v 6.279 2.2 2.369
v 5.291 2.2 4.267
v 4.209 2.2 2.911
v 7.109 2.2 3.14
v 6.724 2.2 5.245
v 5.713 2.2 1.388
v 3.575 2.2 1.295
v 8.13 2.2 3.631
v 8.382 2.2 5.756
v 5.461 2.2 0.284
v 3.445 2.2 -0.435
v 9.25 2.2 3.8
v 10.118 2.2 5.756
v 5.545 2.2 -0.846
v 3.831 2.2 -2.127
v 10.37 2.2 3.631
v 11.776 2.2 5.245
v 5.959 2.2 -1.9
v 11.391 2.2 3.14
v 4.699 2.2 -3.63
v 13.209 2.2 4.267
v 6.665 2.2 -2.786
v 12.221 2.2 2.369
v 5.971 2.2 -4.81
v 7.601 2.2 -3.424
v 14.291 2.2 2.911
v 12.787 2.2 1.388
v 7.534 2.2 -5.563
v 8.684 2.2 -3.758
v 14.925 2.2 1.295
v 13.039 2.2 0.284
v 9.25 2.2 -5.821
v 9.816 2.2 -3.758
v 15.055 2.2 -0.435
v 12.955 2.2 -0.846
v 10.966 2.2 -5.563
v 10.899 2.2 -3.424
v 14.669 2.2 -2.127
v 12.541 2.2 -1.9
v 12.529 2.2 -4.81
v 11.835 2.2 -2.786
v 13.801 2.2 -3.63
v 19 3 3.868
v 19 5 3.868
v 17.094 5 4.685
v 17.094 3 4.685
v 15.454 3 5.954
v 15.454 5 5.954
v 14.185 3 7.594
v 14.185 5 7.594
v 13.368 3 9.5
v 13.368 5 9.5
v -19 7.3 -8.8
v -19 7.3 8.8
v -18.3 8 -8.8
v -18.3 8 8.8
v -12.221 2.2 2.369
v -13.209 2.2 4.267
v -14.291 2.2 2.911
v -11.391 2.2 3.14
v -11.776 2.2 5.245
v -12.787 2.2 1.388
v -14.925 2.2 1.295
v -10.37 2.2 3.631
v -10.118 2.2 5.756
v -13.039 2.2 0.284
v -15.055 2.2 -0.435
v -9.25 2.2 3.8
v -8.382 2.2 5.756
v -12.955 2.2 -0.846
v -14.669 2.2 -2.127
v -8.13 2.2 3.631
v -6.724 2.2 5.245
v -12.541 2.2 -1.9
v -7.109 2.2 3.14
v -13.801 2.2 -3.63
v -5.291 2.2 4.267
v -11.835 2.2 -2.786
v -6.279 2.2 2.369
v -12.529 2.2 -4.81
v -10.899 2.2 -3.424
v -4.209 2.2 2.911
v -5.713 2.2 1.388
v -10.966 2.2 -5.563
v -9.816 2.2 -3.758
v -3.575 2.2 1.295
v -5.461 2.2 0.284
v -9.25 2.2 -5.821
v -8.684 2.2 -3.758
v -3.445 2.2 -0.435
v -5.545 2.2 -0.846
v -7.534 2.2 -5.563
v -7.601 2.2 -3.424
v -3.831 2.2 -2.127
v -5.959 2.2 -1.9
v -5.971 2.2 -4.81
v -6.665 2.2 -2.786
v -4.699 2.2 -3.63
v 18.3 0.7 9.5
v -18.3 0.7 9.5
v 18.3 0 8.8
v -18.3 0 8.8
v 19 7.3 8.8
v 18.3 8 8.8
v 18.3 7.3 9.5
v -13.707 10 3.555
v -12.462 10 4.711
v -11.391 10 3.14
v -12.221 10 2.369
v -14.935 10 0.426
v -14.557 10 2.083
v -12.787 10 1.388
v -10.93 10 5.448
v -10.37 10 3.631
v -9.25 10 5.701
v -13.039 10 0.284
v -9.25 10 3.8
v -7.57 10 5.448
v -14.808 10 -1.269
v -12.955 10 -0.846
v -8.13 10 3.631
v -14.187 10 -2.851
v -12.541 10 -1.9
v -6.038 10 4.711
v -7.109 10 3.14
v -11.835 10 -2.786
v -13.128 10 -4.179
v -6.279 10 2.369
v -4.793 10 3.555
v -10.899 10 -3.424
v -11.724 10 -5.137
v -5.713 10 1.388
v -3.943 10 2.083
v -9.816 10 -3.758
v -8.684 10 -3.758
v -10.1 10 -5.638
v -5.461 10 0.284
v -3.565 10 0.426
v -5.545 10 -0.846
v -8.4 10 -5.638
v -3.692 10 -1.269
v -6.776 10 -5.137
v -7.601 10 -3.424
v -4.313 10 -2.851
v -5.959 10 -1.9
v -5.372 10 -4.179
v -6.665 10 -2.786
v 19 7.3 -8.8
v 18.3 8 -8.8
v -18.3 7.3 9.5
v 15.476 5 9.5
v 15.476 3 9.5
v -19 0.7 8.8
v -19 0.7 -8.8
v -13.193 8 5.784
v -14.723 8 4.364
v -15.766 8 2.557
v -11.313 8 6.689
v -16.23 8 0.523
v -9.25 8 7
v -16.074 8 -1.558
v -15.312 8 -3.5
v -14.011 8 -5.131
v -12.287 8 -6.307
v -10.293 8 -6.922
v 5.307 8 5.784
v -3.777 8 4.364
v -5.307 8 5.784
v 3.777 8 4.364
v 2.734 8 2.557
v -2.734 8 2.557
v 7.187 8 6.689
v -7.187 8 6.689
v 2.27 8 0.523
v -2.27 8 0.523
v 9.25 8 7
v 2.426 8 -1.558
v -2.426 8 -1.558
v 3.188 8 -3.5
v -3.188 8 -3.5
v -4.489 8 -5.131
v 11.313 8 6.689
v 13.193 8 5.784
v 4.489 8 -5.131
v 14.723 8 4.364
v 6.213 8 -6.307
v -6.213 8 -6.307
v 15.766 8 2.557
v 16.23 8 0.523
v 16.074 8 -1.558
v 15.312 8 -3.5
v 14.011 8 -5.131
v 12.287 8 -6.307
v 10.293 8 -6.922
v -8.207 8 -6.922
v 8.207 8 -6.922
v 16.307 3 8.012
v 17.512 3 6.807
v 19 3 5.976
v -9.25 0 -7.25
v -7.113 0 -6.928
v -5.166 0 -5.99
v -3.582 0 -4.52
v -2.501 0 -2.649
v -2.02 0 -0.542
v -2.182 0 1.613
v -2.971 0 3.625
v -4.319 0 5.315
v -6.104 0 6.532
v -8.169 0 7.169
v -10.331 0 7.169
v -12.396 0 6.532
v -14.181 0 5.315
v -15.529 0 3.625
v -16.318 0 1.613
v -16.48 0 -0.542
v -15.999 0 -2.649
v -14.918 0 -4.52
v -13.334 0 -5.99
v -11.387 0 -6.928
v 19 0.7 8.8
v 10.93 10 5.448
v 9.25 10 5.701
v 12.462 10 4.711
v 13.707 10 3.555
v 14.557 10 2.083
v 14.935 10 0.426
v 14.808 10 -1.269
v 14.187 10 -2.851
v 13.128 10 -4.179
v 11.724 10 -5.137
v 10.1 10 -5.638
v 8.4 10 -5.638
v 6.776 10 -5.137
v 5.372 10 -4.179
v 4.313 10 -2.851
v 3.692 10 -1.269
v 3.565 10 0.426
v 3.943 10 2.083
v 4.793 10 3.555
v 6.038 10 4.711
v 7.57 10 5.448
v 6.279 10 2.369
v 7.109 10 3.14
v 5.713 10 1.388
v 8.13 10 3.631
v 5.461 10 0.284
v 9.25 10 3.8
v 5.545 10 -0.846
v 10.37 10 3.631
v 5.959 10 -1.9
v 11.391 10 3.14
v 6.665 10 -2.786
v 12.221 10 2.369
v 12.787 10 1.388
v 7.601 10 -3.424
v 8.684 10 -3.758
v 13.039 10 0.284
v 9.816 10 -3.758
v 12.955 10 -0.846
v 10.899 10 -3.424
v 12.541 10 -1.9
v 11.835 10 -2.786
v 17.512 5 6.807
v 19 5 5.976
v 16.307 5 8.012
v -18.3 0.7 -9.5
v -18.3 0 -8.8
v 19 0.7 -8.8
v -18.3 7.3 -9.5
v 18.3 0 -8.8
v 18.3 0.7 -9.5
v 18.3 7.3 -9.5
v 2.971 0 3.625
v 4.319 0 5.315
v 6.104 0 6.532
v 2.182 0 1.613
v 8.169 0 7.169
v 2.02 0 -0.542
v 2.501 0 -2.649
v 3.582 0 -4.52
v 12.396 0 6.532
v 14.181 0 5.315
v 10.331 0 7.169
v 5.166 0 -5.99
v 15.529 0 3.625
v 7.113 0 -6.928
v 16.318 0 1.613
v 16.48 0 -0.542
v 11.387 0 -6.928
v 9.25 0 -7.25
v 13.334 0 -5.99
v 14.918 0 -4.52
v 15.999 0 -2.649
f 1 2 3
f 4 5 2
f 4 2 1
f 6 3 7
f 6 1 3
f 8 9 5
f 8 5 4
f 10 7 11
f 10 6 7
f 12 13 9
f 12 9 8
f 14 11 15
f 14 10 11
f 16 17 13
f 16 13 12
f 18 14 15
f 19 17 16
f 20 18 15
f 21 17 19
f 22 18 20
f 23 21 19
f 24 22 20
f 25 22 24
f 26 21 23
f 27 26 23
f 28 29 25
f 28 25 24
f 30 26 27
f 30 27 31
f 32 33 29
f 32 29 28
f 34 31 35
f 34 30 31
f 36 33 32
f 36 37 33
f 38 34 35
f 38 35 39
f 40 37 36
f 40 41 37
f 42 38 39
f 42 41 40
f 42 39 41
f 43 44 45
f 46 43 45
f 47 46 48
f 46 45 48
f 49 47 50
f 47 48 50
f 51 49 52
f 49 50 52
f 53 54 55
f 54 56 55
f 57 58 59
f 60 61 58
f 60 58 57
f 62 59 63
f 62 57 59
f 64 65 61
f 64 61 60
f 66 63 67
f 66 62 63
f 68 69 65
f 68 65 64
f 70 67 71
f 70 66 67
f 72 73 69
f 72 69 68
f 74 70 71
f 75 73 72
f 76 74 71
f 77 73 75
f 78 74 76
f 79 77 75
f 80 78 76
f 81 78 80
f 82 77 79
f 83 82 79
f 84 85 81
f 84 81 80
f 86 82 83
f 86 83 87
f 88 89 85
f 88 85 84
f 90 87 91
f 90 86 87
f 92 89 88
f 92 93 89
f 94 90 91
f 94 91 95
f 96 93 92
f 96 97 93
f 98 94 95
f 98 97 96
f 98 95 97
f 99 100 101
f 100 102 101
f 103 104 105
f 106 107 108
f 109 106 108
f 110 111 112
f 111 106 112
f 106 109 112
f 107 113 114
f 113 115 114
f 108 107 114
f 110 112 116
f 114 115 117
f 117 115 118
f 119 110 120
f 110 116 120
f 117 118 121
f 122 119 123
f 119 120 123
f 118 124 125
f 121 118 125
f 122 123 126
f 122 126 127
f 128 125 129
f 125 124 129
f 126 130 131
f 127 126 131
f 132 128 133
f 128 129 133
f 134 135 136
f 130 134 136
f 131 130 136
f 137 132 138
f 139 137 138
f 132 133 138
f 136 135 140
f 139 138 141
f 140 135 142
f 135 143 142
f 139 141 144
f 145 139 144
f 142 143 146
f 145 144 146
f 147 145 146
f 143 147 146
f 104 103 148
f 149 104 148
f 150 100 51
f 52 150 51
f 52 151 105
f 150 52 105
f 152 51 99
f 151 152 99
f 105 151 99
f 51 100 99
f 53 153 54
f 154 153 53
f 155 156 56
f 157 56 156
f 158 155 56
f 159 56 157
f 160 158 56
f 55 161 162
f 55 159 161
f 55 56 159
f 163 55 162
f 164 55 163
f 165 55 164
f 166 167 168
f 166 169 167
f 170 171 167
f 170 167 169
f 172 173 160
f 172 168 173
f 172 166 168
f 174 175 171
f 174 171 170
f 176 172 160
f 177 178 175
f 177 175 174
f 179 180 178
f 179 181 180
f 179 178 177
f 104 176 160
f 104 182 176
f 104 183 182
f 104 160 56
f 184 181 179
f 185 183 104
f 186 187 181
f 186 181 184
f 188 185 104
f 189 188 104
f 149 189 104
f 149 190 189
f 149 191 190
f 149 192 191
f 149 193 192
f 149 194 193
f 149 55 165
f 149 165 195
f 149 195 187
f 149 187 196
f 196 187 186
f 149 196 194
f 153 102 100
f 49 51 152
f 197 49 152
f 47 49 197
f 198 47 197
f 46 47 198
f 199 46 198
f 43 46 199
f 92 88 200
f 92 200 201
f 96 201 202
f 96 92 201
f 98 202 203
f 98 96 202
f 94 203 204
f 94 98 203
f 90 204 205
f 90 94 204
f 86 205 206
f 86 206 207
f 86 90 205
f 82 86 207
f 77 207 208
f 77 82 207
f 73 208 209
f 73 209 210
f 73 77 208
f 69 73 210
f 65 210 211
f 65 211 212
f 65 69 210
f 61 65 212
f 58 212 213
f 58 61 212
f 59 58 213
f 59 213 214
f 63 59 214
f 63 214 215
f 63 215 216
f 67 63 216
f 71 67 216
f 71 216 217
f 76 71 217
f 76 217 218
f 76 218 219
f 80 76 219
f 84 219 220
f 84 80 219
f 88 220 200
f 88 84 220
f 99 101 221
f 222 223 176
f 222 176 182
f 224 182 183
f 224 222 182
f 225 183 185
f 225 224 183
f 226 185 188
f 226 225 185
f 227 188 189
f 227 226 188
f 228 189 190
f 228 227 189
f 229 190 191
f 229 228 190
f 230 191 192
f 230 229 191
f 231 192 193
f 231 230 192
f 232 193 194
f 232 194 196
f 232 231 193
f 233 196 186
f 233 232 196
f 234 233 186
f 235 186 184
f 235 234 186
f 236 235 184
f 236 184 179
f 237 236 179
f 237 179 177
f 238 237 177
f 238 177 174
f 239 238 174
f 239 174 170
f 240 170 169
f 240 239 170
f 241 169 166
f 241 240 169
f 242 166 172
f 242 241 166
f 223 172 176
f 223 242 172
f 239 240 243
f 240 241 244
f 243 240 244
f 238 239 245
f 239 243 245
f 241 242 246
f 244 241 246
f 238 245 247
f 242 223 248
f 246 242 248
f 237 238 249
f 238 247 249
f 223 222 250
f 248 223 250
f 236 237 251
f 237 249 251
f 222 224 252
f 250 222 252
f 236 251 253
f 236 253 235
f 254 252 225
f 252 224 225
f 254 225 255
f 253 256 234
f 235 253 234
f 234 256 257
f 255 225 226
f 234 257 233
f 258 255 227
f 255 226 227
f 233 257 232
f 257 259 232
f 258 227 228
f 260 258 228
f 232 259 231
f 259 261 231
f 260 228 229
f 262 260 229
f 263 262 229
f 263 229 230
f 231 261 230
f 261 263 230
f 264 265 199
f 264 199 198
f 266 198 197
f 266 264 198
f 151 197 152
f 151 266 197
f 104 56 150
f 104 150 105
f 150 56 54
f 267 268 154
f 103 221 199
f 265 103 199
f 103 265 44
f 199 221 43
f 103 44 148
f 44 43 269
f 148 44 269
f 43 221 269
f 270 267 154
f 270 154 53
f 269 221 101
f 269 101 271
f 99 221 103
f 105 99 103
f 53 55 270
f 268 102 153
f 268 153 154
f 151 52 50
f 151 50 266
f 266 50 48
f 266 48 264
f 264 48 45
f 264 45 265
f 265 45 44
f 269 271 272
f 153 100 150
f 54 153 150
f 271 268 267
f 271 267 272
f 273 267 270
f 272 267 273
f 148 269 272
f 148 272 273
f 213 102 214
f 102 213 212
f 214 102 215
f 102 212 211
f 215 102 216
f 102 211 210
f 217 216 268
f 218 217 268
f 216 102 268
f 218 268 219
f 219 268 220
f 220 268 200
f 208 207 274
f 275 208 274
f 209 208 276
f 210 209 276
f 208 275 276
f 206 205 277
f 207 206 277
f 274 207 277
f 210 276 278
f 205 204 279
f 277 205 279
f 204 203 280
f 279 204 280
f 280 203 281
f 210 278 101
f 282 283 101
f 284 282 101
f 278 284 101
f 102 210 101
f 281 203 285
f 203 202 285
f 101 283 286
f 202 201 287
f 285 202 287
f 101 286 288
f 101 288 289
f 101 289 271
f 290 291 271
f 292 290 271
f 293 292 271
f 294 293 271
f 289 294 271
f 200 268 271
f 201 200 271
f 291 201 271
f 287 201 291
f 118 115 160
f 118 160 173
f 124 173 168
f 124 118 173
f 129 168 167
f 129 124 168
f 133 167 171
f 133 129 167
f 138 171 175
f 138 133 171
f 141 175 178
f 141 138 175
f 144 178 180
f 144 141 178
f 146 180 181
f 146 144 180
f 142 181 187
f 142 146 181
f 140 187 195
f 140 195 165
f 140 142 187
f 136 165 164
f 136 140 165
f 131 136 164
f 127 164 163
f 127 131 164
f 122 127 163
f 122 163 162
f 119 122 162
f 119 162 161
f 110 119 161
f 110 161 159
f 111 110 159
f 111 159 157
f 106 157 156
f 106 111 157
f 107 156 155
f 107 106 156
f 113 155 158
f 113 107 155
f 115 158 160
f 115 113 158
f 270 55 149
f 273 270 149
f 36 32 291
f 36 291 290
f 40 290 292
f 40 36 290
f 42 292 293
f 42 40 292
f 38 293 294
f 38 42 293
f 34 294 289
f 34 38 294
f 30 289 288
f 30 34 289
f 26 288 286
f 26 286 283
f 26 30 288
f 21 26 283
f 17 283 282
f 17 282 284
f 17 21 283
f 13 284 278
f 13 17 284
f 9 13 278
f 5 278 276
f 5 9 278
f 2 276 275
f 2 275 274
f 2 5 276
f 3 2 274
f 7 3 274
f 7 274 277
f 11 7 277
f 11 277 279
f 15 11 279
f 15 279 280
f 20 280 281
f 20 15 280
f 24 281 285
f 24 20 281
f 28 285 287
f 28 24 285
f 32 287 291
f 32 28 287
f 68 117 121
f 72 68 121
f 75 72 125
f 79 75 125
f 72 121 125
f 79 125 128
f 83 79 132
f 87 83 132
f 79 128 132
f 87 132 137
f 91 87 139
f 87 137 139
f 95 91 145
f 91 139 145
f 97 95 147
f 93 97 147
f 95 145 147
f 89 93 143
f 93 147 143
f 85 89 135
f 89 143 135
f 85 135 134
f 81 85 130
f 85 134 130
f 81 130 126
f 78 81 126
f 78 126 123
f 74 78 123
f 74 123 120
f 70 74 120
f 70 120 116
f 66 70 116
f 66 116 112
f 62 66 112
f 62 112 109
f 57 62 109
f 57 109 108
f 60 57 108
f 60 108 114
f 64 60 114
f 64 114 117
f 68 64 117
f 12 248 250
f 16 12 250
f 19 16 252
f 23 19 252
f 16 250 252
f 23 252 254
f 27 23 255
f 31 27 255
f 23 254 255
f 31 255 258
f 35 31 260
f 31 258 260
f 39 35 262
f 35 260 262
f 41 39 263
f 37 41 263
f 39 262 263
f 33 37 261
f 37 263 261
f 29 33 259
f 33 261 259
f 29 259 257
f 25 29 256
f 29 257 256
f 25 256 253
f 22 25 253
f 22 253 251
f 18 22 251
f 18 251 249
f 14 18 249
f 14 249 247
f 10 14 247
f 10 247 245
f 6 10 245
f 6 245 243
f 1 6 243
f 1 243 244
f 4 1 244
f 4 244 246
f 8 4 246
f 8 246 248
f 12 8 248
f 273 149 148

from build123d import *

# Parameters (mm, degrees)
CROQUIS1_W              = 38
CROQUIS1_H              = 19
SALIENTE_EXTRUIR1_DEPTH = 8
CROQUIS2_R              = 5
SALIENTE_EXTRUIR2_DEPTH = 2
CROQUIS3_R              = 3.8
CORTAR_EXTRUIR1_DEPTH   = 24.478713764
CHAFL_N2_SIZE           = 0.7
CROQUIS4_R              = 5.25
CORTAR_EXTRUIR2_DEPTH   = 2.2
CHAFL_N1_SIZE           = 2
CHAFL_N1_SIZE_2         = 3.079729928
CORTAR_EXTRUIR3_START   = -3
CROQUIS6_R              = 8.19764283
CROQUIS6_R_2            = 6.19764283
CORTAR_EXTRUIR3_DEPTH   = 2


with BuildPart() as part:
    # Croquis1 → Saliente-Extruir1 (new body)
    with BuildSketch(Plane(origin=(0, 0, 0), x_dir=(1, 0, 0), z_dir=(0, 1, 0))):
        Rectangle(CROQUIS1_W, CROQUIS1_H)
    extrude(amount=SALIENTE_EXTRUIR1_DEPTH)

    # Croquis2 → Saliente-Extruir2 (add)
    with BuildSketch(Plane(origin=(0, 8, 0), x_dir=(1, 0, 0), z_dir=(0, 1, 0))):
        with Locations(Location((-9.25, 0, 0), (0, 0, 270))):
            Circle(CROQUIS2_R)
        with Locations(Location((9.25, 0, 0), (0, 0, 270))):
            Circle(CROQUIS2_R)
    extrude(amount=SALIENTE_EXTRUIR2_DEPTH)

    # Croquis3 → Cortar-Extruir1 (cut, through all)
    with BuildSketch(Plane(origin=(0, 10, 0), x_dir=(1, 0, 0), z_dir=(0, 1, 0))):
        with Locations(Location((9.25, 0, 0), (0, 0, 270))):
            Circle(CROQUIS3_R)
        with Locations(Location((-9.25, 0, 0), (0, 0, 270))):
            Circle(CROQUIS3_R)
    extrude(amount=-CORTAR_EXTRUIR1_DEPTH, mode=Mode.SUBTRACT)

    # Chaflán2
    chafl_n2_edges = [part.edges().sort_by_distance(p)[0] for p in [
        (-19, 8, 0),
        (0, 8, 9.5),
        (19, 8, 0),
        (0, 0, 9.5),
        (-19, 0, 0),
        (0, 0, -9.5),
        (19, 0, 0),
        (0, 8, -9.5),
        (19, 4, 9.5),
        (-19, 4, 9.5),
        (-19, 4, -9.5),
        (19, 4, -9.5),
    ]]
    chamfer(chafl_n2_edges, length=CHAFL_N2_SIZE)

    # Croquis4 → Cortar-Extruir2 (cut)
    with BuildSketch(Plane.XZ):
        with Locations(Location((9.25, 0, 0), (0, 0, 270))):
            Circle(CROQUIS4_R)
        with Locations(Location((-9.25, 0, 0), (0, 0, 270))):
            Circle(CROQUIS4_R)
    extrude(amount=-CORTAR_EXTRUIR2_DEPTH, mode=Mode.SUBTRACT)

    # Chaflán1
    # the kernel refuses this chamfer: 3.079729928, 2 mm, written as the material it adds along each edge
    with BuildSketch(Plane(origin=(9.25, 8, 0), x_dir=(0, 0, 1), z_dir=(-1, 0, 0))) as chafl_n1_piece_1_section:
        Polygon((5 + CHAFL_N1_SIZE, 0), (5, CHAFL_N1_SIZE_2), (5, 0), align=None)
    chafl_n1_piece_1 = revolve(axis=Axis((9.25, 8, 0), (0, 1, 0)), mode=Mode.PRIVATE)
    chafl_n1_piece_1 = split(chafl_n1_piece_1, bisect_by=Plane(origin=(9.25, 10, -6.344305077), z_dir=(0, -1, 0)), keep=Keep.TOP, mode=Mode.PRIVATE)
    add(chafl_n1_piece_1)
    with BuildSketch(Plane(origin=(-9.25, 8, 0), x_dir=(0, 0, 1), z_dir=(-1, 0, 0))) as chafl_n1_piece_2_section:
        Polygon((5 + CHAFL_N1_SIZE, 0), (5, CHAFL_N1_SIZE_2), (5, 0), align=None)
    chafl_n1_piece_2 = revolve(axis=Axis((-9.25, 8, 0), (0, 1, 0)), mode=Mode.PRIVATE)
    chafl_n1_piece_2 = split(chafl_n1_piece_2, bisect_by=Plane(origin=(-9.25, 10, -6.344305078), z_dir=(0, -1, 0)), keep=Keep.TOP, mode=Mode.PRIVATE)
    add(chafl_n1_piece_2)
    # the kernel refuses this chamfer: 3.079729928, 2 mm, written as the material it takes off along each edge
    with BuildSketch(Plane(origin=(-9.25, 0, 0), x_dir=(0, 0, -1), z_dir=(-1, 0, 0))) as chafl_n1_2_piece_1_section:
        Polygon((5.25 + CHAFL_N1_SIZE, 0), (5.25, -CHAFL_N1_SIZE_2), (5.25, 0), align=None)
    chafl_n1_2_piece_1 = revolve(axis=Axis((-9.25, 0, 0), (0, -1, 0)), mode=Mode.PRIVATE)
    chafl_n1_2_piece_1 = split(chafl_n1_2_piece_1, bisect_by=Plane(origin=(-9.25, 2.2, 6.528205243), z_dir=(0, -1, 0)), keep=Keep.TOP, mode=Mode.PRIVATE)
    add(chafl_n1_2_piece_1, mode=Mode.SUBTRACT)
    with BuildSketch(Plane(origin=(9.25, 0, 0), x_dir=(0, 0, -1), z_dir=(-1, 0, 0))) as chafl_n1_2_piece_2_section:
        Polygon((5.25 + CHAFL_N1_SIZE, 0), (5.25, -CHAFL_N1_SIZE_2), (5.25, 0), align=None)
    chafl_n1_2_piece_2 = revolve(axis=Axis((9.25, 0, 0), (0, -1, 0)), mode=Mode.PRIVATE)
    chafl_n1_2_piece_2 = split(chafl_n1_2_piece_2, bisect_by=Plane(origin=(9.25, 2.2, 6.528205242), z_dir=(0, -1, 0)), keep=Keep.TOP, mode=Mode.PRIVATE)
    add(chafl_n1_2_piece_2, mode=Mode.SUBTRACT)

    # Croquis6 → Cortar-Extruir3 (cut)
    with BuildSketch(Plane(origin=(0, 8, 0), x_dir=(1, 0, 0), z_dir=(0, 1, 0)).offset(CORTAR_EXTRUIR3_START)):
        with Locations((21.250343834, -11.750343834)):
            Circle(CROQUIS6_R)
        with Locations((21.250343834, -11.750343834)):
            Circle(CROQUIS6_R_2, mode=Mode.SUBTRACT)
    extrude(amount=-CORTAR_EXTRUIR3_DEPTH, mode=Mode.SUBTRACT)


solid = part.part
